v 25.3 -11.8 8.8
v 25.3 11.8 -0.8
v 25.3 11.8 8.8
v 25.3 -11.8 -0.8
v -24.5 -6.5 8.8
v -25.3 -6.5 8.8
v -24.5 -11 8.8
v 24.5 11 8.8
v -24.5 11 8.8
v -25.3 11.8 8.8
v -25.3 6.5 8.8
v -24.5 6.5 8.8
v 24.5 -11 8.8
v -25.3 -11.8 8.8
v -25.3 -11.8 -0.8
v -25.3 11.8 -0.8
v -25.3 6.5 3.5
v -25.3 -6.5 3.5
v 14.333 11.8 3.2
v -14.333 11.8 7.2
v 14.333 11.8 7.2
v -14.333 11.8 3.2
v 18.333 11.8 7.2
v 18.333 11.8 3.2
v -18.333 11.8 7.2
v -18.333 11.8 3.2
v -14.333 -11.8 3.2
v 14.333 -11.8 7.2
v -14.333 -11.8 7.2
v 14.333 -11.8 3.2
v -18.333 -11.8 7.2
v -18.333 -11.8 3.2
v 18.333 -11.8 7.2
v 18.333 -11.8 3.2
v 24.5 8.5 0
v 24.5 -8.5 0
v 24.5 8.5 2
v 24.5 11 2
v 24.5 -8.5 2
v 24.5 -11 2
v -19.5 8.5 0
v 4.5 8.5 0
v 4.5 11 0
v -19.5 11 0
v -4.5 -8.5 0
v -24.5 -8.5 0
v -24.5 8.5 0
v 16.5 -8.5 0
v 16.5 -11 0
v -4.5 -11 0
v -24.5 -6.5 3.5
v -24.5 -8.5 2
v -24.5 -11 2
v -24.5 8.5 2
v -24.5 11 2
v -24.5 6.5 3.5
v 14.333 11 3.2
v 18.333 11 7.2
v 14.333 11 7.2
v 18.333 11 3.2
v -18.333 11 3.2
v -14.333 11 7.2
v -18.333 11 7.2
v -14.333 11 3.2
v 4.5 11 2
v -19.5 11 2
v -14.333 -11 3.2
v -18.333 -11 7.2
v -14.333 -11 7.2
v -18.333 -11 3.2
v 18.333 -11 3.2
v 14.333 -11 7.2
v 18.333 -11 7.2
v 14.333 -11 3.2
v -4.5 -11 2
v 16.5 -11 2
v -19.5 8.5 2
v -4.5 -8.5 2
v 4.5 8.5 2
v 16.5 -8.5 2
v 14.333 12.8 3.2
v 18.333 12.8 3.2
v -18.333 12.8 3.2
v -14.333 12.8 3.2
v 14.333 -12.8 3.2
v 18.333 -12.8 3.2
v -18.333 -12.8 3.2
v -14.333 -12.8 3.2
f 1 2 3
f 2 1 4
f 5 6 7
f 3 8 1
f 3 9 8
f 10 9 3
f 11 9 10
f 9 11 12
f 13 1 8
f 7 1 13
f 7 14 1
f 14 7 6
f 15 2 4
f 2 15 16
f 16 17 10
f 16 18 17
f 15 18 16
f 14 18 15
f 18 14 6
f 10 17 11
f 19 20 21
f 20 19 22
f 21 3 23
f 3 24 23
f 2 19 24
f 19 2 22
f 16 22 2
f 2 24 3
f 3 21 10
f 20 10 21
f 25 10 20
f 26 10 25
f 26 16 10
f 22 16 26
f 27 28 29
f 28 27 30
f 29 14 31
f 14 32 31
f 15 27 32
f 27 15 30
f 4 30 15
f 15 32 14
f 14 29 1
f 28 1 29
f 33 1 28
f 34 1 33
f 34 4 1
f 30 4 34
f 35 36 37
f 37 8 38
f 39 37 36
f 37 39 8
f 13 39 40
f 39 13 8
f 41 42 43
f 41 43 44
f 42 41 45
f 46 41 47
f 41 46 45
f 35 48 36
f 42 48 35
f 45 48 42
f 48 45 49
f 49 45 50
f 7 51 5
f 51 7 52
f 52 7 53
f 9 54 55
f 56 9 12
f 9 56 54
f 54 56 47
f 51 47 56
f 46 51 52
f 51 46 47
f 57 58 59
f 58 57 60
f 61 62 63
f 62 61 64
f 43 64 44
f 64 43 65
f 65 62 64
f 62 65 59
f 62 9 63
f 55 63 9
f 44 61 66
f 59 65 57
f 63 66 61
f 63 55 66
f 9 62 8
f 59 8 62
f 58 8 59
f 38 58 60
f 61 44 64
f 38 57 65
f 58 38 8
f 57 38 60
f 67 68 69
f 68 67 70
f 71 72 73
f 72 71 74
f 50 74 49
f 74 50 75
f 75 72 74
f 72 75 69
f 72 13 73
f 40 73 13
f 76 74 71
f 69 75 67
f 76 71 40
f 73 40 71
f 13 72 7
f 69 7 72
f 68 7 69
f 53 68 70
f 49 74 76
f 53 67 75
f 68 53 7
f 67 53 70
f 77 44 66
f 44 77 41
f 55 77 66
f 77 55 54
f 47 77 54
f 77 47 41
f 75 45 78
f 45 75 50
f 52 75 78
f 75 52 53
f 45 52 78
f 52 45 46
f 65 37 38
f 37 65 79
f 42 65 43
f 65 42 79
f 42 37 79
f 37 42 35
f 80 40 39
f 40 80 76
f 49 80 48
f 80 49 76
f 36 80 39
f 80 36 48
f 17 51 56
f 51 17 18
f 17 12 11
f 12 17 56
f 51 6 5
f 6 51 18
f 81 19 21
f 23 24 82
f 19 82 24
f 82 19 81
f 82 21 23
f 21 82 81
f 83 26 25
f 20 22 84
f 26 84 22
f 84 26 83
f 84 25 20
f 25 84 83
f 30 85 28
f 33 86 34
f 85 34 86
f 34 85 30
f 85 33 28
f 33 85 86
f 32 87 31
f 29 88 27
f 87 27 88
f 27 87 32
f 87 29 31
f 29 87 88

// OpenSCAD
// file: Dimensions.scad
overlap=0.006;

BoxInnerLength=49;
BoxInnerWidth=22;
BoxInnerHeight=8-1+1;

UsbLength=20;
UsbWidth=13;
UsbHeight=6;
UsbDeltaZ=1;

Wall=0.8;

clipX=4;
clipY=1;
clipZ=4;
// main file
include <Dimensions.scad>

createUsbAspCaseModel();

module createUsbAspCaseModel(){
    addClips(){
        difference()
        {
            createBox();

            translate([-BoxInnerLength/2,0,UsbHeight/2+3.5])
            cube(size=[UsbLength,UsbWidth,UsbHeight],center=true);
        }
    }
}

module createBox(){
    translate([0,0,BoxInnerHeight/2])
    difference()
    {
        cube(size=[BoxInnerLength+Wall*2,BoxInnerWidth+Wall*2,BoxInnerHeight+Wall*2],center=true);

        color("red")
        translate([0,0,10/2])
        cube(size=[BoxInnerLength,BoxInnerWidth,BoxInnerHeight+10],center=true);
    }

    brace1X=5;
    braceY=2.5;
    braceZ=2;
    translate([brace1X/2-BoxInnerLength/2,-braceY/2+BoxInnerWidth/2,braceZ/2])
    cube([brace1X,braceY,braceZ],center=true);

    brace2X=20;
    translate([brace2X/2-BoxInnerLength/2,braceY/2-BoxInnerWidth/2,braceZ/2])
    cube([brace2X,braceY,braceZ],center=true);
    translate([-brace2X/2+BoxInnerLength/2,-braceY/2+BoxInnerWidth/2,braceZ/2])
    cube([brace2X,braceY,braceZ],center=true);

    brace3X=8;
    translate([-brace3X/2+BoxInnerLength/2,braceY/2-BoxInnerWidth/2,braceZ/2])
    cube([brace3X,braceY,braceZ],center=true);
}

module addClips(){
    children();

    translate([BoxInnerLength/3,BoxInnerWidth/2,clipX/2+BoxInnerHeight/2+1.2])
    createClip();

    translate([-BoxInnerLength/3,BoxInnerWidth/2,clipX/2+BoxInnerHeight/2+1.2])
    createClip();

    translate([BoxInnerLength/3,-BoxInnerWidth/2,clipX/2+BoxInnerHeight/2+1.2])
    createClip(180);

    translate([-BoxInnerLength/3,-BoxInnerWidth/2,clipX/2+BoxInnerHeight/2+1.2])
    createClip(180);
}

module createClip(rotateZ=0){
    rotate([0,90,rotateZ])
    linear_extrude(height = clipZ, center = true, convexity = 10, twist = 0)
    polygon(points=[
        [0,0],
        [0,Wall],
        [clipX,Wall+clipY],
        [clipX,0],
    ]);
}
